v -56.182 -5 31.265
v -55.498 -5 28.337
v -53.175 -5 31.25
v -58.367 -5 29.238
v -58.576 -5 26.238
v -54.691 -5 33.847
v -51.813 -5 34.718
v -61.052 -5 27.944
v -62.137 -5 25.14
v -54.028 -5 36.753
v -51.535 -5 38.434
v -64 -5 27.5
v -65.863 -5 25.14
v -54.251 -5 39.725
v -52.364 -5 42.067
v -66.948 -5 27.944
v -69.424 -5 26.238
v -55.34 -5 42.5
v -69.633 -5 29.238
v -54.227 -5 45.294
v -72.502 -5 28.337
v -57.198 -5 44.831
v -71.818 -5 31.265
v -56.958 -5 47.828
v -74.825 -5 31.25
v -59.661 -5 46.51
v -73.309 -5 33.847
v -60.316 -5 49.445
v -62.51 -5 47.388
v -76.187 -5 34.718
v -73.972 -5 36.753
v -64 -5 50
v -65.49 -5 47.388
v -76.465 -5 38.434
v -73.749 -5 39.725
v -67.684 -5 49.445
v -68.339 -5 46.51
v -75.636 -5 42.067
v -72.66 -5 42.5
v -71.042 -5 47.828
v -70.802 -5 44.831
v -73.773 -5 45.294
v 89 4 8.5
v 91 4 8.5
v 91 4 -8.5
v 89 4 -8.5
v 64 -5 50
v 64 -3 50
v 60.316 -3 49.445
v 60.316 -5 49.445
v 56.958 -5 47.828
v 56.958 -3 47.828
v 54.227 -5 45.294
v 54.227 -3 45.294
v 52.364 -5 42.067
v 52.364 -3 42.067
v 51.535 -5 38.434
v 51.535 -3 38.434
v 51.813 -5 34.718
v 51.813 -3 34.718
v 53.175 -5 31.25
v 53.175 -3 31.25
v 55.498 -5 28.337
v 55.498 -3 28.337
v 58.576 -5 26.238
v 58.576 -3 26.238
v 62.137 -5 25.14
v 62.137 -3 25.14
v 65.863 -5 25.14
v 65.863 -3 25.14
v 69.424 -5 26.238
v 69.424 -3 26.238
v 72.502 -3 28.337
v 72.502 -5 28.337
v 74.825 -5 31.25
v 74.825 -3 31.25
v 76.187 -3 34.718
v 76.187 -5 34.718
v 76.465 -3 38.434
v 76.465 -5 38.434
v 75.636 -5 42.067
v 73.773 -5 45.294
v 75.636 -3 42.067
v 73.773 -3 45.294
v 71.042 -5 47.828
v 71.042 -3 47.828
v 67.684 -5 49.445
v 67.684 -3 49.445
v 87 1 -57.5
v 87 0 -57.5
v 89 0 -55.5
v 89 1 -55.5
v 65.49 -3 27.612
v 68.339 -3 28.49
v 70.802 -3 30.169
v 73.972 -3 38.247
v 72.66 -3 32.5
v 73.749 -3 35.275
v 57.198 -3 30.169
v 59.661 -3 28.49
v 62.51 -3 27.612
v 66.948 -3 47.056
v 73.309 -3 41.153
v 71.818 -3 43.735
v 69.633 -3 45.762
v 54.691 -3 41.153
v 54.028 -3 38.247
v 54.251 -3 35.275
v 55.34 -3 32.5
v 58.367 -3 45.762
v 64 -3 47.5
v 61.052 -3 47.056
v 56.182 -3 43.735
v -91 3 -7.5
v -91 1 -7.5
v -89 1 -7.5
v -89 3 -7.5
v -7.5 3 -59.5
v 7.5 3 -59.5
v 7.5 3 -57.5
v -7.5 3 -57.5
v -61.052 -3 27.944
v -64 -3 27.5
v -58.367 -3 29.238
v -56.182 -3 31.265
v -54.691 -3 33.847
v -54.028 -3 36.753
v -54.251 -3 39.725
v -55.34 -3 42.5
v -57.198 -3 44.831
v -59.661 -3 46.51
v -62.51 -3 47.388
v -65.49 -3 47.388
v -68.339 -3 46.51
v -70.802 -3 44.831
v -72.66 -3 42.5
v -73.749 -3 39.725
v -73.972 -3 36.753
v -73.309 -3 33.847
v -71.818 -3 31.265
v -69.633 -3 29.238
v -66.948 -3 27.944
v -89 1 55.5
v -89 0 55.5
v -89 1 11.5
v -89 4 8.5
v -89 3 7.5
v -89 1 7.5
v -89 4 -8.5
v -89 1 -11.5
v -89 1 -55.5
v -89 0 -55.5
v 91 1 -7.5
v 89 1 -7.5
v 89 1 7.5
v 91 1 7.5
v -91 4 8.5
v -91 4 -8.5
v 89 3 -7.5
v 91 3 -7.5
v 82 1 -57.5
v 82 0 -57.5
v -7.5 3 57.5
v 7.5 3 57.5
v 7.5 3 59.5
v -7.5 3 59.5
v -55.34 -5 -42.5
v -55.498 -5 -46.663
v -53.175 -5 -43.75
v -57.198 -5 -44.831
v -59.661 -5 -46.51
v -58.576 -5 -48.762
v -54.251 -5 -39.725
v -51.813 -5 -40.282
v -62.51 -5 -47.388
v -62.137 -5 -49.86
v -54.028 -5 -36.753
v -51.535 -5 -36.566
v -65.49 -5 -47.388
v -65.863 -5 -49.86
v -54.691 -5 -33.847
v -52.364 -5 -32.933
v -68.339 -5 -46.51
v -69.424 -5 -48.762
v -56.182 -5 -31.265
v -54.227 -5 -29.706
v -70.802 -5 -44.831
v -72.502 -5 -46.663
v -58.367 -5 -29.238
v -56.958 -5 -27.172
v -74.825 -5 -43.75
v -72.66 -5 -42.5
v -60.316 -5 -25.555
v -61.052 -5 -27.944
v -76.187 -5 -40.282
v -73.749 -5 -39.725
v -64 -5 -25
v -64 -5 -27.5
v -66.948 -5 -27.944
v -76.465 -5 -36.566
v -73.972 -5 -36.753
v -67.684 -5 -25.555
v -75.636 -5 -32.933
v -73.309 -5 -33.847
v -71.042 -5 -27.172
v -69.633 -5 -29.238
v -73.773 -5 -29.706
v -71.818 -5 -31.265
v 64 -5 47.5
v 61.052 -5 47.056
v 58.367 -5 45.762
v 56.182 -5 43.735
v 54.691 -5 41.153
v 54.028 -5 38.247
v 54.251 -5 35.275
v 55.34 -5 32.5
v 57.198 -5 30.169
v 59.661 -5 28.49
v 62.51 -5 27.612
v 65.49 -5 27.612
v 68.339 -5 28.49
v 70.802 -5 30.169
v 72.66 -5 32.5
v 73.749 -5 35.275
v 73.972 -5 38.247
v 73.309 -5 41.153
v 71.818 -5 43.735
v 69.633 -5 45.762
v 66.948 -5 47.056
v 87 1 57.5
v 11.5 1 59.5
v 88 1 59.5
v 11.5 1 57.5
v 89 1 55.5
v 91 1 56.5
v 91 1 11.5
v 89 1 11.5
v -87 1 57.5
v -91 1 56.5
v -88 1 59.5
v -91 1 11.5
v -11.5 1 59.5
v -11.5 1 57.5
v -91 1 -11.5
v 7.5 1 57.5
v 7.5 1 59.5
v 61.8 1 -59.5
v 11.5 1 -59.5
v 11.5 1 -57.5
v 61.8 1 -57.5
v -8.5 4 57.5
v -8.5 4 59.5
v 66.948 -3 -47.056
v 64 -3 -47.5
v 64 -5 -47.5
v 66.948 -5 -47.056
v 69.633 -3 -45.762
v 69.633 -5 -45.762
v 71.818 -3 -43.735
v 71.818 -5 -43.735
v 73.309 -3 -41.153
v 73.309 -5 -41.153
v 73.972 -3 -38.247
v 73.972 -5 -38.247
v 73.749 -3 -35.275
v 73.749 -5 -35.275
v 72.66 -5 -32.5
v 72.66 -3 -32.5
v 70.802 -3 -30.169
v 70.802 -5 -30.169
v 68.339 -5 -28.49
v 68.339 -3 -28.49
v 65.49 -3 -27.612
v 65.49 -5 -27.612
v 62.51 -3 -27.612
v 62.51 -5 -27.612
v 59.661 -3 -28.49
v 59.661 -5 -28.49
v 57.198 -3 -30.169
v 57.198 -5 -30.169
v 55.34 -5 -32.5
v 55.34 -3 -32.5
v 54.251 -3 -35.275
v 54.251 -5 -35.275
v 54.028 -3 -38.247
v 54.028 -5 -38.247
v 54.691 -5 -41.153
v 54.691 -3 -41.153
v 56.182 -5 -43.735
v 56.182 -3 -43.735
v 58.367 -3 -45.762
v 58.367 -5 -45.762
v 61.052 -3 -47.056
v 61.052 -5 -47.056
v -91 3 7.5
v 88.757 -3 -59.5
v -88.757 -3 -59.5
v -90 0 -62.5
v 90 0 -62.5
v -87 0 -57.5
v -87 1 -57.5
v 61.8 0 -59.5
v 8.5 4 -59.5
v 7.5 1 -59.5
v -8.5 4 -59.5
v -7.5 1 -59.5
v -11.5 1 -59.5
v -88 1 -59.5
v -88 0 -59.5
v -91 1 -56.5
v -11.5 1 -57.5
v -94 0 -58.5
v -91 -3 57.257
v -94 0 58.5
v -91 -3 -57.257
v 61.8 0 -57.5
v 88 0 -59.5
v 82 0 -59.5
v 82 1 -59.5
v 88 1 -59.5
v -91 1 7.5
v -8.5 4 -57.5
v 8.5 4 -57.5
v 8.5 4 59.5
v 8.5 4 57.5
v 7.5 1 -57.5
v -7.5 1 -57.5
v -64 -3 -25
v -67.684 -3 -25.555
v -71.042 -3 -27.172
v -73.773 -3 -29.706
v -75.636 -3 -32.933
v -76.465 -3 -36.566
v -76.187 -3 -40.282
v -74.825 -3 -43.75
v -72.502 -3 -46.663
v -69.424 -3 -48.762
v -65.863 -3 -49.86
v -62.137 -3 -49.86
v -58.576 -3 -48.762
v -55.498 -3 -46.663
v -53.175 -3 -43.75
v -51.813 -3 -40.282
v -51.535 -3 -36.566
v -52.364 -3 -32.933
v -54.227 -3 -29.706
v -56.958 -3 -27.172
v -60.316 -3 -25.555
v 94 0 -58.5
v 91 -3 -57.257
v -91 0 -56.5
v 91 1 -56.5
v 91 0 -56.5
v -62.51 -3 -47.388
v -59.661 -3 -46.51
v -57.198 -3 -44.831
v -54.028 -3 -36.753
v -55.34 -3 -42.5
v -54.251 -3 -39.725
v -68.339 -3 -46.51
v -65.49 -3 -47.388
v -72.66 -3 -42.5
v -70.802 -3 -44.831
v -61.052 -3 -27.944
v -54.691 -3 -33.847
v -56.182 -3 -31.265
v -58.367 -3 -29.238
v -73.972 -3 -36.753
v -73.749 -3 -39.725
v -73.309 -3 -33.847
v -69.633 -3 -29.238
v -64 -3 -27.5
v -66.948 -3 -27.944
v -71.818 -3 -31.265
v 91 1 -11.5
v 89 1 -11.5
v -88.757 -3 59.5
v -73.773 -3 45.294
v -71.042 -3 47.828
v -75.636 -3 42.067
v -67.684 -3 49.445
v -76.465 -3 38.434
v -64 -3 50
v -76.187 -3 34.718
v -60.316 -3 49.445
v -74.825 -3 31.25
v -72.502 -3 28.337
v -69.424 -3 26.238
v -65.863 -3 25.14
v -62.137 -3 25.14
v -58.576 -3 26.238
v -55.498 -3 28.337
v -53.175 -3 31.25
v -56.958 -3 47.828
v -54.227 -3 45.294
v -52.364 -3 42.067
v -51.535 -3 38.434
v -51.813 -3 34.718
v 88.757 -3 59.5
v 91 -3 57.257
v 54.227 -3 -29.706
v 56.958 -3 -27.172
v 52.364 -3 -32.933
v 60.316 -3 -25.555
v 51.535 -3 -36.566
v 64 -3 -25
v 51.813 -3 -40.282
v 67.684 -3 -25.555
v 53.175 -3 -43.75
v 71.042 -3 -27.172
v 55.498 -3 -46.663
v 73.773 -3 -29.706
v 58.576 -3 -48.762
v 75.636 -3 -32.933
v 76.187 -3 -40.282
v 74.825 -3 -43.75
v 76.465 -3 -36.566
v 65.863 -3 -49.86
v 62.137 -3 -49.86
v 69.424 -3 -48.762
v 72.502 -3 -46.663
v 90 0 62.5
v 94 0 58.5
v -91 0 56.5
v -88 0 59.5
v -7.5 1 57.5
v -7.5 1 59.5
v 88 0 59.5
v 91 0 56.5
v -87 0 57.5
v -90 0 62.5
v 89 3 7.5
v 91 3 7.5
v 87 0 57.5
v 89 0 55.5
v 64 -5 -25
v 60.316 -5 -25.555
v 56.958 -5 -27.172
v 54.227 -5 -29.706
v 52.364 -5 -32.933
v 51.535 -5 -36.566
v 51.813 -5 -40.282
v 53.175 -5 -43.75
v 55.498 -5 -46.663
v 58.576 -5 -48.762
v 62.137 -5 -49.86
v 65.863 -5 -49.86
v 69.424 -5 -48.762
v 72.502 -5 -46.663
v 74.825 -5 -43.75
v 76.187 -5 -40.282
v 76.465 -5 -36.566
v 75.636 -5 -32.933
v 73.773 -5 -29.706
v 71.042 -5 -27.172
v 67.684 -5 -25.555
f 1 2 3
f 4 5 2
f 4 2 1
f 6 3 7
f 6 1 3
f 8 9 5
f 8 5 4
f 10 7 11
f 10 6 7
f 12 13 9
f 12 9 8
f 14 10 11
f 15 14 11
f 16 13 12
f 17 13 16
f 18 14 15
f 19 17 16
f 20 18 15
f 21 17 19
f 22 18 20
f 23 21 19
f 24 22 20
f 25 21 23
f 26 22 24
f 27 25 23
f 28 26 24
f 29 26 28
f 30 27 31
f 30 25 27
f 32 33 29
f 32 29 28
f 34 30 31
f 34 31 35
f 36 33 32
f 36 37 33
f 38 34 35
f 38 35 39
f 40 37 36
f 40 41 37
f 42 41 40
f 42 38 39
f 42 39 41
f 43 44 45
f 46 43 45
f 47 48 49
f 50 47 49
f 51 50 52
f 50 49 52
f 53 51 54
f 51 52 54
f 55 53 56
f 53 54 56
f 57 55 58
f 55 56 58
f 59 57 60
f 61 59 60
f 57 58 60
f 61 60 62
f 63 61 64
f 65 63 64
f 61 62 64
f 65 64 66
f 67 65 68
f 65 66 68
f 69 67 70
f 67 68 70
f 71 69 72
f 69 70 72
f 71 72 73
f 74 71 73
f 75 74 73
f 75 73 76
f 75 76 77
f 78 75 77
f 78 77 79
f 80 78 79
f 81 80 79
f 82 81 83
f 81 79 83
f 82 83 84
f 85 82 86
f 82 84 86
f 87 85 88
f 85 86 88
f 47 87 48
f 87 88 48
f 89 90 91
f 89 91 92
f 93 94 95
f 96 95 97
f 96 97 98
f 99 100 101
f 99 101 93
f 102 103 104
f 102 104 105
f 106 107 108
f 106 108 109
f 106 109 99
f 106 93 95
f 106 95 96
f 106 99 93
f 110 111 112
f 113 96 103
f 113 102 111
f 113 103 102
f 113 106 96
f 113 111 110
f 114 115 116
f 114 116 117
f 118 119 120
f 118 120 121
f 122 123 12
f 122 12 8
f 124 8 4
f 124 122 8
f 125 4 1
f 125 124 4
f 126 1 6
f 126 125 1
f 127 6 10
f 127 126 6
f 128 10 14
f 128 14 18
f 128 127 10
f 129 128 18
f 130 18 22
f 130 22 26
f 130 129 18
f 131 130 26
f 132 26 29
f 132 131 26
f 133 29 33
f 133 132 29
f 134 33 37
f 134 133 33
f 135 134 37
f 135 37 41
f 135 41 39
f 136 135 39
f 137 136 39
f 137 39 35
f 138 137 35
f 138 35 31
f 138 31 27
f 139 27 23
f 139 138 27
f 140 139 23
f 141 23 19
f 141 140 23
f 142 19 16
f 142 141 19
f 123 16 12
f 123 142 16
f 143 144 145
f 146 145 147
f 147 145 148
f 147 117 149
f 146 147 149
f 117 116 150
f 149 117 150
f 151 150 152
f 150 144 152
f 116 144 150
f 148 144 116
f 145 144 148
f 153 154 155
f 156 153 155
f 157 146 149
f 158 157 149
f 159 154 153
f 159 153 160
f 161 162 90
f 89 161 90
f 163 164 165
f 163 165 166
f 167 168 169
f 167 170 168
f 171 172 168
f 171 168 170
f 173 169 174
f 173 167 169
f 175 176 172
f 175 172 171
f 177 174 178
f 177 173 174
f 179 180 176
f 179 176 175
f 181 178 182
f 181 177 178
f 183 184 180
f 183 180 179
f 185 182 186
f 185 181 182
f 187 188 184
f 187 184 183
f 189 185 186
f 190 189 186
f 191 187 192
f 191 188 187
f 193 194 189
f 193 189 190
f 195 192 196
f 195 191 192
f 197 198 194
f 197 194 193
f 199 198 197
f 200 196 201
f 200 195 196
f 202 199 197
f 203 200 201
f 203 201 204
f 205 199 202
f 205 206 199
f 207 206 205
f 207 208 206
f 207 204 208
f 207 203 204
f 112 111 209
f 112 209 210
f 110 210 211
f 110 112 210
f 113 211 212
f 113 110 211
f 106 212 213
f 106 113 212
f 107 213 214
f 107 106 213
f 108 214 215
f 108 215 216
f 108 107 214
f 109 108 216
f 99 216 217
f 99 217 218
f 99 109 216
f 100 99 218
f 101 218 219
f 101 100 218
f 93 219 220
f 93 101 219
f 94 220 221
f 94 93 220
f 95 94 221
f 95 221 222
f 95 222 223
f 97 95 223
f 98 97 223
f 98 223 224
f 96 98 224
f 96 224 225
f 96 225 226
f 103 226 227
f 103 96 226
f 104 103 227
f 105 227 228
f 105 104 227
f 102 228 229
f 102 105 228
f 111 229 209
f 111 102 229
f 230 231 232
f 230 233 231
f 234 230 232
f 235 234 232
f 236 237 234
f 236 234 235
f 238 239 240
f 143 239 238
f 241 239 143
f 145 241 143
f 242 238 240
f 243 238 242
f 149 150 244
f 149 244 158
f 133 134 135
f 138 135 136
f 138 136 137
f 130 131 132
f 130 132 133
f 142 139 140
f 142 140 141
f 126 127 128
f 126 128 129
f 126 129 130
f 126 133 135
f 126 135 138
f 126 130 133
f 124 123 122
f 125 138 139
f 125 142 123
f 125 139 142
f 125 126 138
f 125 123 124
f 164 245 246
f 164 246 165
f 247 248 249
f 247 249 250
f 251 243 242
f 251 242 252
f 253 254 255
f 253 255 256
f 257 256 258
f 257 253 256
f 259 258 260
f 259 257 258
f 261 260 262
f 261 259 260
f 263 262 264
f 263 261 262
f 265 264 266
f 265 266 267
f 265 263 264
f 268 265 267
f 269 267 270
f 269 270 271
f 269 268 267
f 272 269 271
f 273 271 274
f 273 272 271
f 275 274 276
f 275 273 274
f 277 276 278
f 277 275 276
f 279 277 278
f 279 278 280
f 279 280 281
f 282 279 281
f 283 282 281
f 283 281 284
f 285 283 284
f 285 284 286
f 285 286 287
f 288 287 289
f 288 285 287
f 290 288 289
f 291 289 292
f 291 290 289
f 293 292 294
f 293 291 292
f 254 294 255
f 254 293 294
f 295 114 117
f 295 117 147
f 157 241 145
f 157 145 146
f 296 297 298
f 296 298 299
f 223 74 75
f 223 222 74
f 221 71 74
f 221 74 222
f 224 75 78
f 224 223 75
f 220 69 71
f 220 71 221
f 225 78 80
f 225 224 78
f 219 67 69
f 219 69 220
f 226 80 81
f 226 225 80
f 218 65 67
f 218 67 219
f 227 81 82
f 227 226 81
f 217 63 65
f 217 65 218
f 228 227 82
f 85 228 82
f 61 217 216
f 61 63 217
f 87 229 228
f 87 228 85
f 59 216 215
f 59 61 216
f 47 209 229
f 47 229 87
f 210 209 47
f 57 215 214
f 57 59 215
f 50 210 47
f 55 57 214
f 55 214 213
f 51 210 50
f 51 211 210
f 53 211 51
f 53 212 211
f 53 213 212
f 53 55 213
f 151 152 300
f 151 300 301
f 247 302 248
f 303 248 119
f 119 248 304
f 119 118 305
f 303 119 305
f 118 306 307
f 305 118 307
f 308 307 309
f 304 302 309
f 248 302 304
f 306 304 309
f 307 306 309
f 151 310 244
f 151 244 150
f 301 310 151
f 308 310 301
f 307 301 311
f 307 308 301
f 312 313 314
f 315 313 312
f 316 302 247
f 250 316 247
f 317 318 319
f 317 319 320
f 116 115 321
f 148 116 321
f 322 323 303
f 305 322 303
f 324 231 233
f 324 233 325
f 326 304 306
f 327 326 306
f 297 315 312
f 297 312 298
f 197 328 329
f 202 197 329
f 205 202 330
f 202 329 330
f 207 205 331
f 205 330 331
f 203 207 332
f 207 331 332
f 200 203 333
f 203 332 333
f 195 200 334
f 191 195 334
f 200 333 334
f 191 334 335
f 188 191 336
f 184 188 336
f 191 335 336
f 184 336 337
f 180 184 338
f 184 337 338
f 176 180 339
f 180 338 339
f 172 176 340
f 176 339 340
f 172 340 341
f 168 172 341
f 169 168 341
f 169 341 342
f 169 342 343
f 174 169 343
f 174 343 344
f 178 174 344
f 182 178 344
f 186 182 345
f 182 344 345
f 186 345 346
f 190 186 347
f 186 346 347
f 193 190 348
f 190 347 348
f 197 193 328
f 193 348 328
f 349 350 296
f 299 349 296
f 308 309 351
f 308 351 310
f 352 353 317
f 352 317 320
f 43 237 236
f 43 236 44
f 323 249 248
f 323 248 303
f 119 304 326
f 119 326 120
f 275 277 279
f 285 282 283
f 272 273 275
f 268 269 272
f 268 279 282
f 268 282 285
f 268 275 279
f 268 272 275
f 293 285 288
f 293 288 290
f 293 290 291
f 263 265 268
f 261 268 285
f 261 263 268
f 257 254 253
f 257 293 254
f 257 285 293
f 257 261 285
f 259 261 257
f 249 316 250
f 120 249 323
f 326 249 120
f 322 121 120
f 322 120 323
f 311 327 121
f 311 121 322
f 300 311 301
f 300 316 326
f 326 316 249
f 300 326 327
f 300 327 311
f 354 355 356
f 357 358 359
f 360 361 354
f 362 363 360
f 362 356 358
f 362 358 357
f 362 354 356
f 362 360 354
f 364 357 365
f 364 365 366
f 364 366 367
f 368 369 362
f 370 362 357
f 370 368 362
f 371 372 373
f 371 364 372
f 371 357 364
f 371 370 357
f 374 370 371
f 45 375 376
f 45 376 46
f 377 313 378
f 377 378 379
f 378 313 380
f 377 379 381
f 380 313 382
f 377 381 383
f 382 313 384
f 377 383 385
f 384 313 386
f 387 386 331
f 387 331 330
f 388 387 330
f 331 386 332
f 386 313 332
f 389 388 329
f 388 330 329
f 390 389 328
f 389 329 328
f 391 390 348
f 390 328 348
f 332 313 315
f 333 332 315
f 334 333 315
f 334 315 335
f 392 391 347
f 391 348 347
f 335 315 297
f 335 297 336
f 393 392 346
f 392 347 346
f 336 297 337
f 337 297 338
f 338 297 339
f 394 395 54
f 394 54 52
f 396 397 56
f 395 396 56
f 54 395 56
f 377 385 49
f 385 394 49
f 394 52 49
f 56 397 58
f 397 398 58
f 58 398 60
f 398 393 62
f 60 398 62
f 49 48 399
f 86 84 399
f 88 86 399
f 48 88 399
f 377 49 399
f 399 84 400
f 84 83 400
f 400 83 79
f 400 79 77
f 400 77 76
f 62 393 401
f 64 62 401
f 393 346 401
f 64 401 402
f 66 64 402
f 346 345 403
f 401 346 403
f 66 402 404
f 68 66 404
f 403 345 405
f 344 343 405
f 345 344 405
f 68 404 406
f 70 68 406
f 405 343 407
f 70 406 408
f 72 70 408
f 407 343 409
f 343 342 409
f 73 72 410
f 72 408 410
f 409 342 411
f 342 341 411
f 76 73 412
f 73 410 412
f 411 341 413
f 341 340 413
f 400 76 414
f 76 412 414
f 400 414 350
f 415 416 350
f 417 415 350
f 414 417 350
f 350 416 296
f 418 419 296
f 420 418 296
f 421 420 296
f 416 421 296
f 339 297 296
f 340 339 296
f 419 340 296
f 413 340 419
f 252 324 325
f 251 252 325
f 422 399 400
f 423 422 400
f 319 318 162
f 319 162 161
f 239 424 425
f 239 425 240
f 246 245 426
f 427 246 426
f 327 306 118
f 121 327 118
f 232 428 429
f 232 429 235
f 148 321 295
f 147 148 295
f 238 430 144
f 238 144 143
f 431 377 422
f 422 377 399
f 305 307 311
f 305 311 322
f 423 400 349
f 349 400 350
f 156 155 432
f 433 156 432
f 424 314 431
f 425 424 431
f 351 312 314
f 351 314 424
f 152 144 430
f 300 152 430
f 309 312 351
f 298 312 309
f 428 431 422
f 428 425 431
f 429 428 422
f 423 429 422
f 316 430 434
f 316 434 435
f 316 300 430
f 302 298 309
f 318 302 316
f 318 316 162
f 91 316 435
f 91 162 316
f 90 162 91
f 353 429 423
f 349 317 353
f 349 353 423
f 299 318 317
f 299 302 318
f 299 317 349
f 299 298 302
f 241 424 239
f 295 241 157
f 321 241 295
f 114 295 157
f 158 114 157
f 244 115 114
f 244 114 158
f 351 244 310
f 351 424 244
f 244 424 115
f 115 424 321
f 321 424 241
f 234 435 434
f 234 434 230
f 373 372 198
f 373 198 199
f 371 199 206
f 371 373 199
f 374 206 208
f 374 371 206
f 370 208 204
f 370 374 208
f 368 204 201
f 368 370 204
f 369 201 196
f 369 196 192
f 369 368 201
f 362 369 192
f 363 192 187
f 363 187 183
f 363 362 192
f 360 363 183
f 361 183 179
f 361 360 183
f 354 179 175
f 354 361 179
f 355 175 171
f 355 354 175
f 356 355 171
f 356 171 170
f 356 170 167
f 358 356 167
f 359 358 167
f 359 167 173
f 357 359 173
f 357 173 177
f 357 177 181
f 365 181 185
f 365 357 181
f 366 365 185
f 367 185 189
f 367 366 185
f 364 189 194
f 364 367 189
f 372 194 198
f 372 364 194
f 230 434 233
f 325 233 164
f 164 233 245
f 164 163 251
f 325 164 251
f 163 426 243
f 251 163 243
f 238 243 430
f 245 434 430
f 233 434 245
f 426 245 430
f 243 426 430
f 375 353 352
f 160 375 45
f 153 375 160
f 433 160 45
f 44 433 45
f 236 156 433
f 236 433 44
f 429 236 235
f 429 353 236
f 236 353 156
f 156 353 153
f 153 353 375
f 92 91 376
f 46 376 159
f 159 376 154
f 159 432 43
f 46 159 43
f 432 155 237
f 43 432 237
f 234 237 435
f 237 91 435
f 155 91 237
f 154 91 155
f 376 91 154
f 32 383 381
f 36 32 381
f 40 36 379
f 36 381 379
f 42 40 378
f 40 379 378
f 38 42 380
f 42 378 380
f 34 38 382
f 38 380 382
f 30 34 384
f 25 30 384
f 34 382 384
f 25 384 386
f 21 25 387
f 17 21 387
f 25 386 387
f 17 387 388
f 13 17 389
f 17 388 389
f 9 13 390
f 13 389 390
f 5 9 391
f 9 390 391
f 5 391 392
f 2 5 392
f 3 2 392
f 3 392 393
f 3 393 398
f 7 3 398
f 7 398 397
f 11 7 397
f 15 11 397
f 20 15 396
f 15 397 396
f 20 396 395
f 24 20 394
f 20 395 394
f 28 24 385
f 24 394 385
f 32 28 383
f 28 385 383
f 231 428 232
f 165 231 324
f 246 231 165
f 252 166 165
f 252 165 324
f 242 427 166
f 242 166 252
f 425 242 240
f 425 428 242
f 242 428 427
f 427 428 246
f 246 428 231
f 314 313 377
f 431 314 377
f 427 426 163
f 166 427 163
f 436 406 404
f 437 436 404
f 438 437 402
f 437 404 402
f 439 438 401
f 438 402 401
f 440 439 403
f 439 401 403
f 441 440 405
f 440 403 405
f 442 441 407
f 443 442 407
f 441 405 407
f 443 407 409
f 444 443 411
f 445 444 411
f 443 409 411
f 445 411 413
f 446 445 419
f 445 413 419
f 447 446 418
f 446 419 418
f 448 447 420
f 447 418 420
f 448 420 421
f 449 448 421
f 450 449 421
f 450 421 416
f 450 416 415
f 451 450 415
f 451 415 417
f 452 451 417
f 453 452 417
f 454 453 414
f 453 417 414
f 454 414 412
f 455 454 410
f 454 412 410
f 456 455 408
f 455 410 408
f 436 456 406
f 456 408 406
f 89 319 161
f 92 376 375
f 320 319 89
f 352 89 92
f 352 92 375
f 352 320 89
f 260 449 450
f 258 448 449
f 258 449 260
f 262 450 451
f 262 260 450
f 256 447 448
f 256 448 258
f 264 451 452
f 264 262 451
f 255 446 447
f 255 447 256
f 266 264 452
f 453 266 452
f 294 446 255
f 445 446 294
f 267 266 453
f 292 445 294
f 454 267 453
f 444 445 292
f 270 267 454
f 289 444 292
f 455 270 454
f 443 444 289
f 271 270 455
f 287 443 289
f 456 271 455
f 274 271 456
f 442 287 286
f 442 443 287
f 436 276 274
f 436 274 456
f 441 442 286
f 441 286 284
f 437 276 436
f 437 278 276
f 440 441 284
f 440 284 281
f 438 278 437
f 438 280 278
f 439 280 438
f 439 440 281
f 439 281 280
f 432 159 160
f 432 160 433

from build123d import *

# Parameters (mm, degrees)
SKETCH_1_W          = 188
SKETCH_1_H          = 125
EXTRUDE_1_DEPTH     = 3
SKETCH_2_W          = 182
SKETCH_2_H          = 119
SKETCH_2_W_2        = 178
SKETCH_2_H_2        = 115
EXTRUDE_2_DEPTH     = 1
CUT_EXTRUDE_1_REACH = 156.042
SKETCH_4_W          = 20.2
SKETCH_4_H          = 1
SKETCH_5_W          = 15
SKETCH_5_H          = 2
SKETCH_5_W_2        = 2
SKETCH_5_H_2        = 15
EXTRUDE_3_DEPTH     = 3
CHAMFER_1_SIZE      = 4
CUT_EXTRUDE_2_REACH = 156.065
SKETCH_6_W          = 15
SKETCH_6_H          = 2
CUT_EXTRUDE_3_REACH = 197.313
SKETCH_7_W          = 15
SKETCH_7_H          = 2
SKETCH_8_R          = 12.5
EXTRUDE_4_DEPTH     = 2
SKETCH_9_R          = 10
CUT_EXTRUDE_4_DEPTH = 2
CHAMFER_2_SIZE      = 4
CHAMFER_3_SIZE      = 3
CHAMFER_4_SIZE      = 2
CHAMFER_5_SIZE      = 3


# Some blends are built 0.0001 mm under size
with BuildPart() as part:
    # 草图1 → 凸台-拉伸1 (new body)
    with BuildSketch(Plane(origin=(0, 0, 0), x_dir=(1, 0, 0), z_dir=(0, 1, 0))):
        Rectangle(SKETCH_1_W, SKETCH_1_H)
    extrude(amount=-EXTRUDE_1_DEPTH)

    # 草图2 → 凸台-拉伸2 (add)
    with BuildSketch(Plane(origin=(0, 0, 0), x_dir=(1, 0, 0), z_dir=(0, 1, 0))):
        Rectangle(SKETCH_2_W, SKETCH_2_H)
        Rectangle(SKETCH_2_W_2, SKETCH_2_H_2, mode=Mode.SUBTRACT)
    extrude(amount=EXTRUDE_2_DEPTH)

    # 草图4 → 切除-拉伸1 (cut, up to next)
    with BuildSketch(Plane(origin=(0, 0, -59.5), x_dir=(-1, 0, 0), z_dir=(0, 0, -1)), mode=Mode.PRIVATE) as cut_extrude_1_sk1:
        with Locations((-71.9, 0.5)):
            Rectangle(SKETCH_4_W, SKETCH_4_H)
    cut_extrude_1_tool1 = extrude(cut_extrude_1_sk1.sketch, amount=-CUT_EXTRUDE_1_REACH, mode=Mode.PRIVATE) & part.part
    add(cut_extrude_1_tool1.solids().sort_by_distance((71.9, 0.5, -59.5))[0], mode=Mode.SUBTRACT)

    # 草图5 → 凸台-拉伸3 (add)
    with BuildSketch(Plane(origin=(0, 1, 0), x_dir=(1, 0, 0), z_dir=(0, 1, 0))):
        with Locations((0, -58.5)):
            Rectangle(SKETCH_5_W, SKETCH_5_H)
        with Locations((90, 0)):
            Rectangle(SKETCH_5_W_2, SKETCH_5_H_2)
        with Locations((0, 58.5)):
            Rectangle(SKETCH_5_W, SKETCH_5_H)
        with Locations((-90, 0)):
            Rectangle(SKETCH_5_W_2, SKETCH_5_H_2)
    extrude(amount=EXTRUDE_3_DEPTH)

    # 倒角1
    # the kernel refuses this chamfer: 4 mm, written as the material it adds along each edge
    with BuildSketch(Plane(origin=(-89, 1, -7.5), x_dir=(0, -0.027495876610586372, -0.9996219169112968), z_dir=(-1, 0, 0))) as chamfer_1_piece_1_section:
        Polygon((CHAMFER_1_SIZE * 0.999621916911, -CHAMFER_1_SIZE * 0.0274958766106), (-CHAMFER_1_SIZE * 0.0274958766106, -CHAMFER_1_SIZE * 0.999621916911), (0, 0), align=None)
    chamfer_1_piece_1 = extrude(amount=2, mode=Mode.PRIVATE)
    chamfer_1_piece_1 = split(chamfer_1_piece_1, bisect_by=Plane(origin=(-90, 4, -8.907836441), z_dir=(0, -1, 0)), keep=Keep.TOP, mode=Mode.PRIVATE)
    add(chamfer_1_piece_1)
    with BuildSketch(Plane(origin=(-91, 1, 7.5), x_dir=(0, -0.027495876610586382, 0.9996219169112968), z_dir=(1, 0, 0))) as chamfer_1_piece_2_section:
        Polygon((CHAMFER_1_SIZE * 0.999621916911, -CHAMFER_1_SIZE * 0.0274958766106), (-CHAMFER_1_SIZE * 0.0274958766106, -CHAMFER_1_SIZE * 0.999621916911), (0, 0), align=None)
    chamfer_1_piece_2 = extrude(amount=2, mode=Mode.PRIVATE)
    chamfer_1_piece_2 = split(chamfer_1_piece_2, bisect_by=Plane(origin=(-90, 4, 8.907836441), z_dir=(0, -1, 0)), keep=Keep.TOP, mode=Mode.PRIVATE)
    add(chamfer_1_piece_2)
    with BuildSketch(Plane(origin=(-7.5, 1, 57.5), x_dir=(-0.9996219169112968, -0.027495876610586382, 0), z_dir=(0, 0, 1))) as chamfer_1_piece_3_section:
        Polygon((CHAMFER_1_SIZE * 0.999621916911, -CHAMFER_1_SIZE * 0.0274958766106), (-CHAMFER_1_SIZE * 0.0274958766106, -CHAMFER_1_SIZE * 0.999621916911), (0, 0), align=None)
    chamfer_1_piece_3 = extrude(amount=2, mode=Mode.PRIVATE)
    chamfer_1_piece_3 = split(chamfer_1_piece_3, bisect_by=Plane(origin=(-8.907836441, 4, 58.5), z_dir=(0, -1, 0)), keep=Keep.TOP, mode=Mode.PRIVATE)
    add(chamfer_1_piece_3)
    with BuildSketch(Plane(origin=(7.5, 1, 59.5), x_dir=(0.9996219169112968, -0.02749587661058638, 0), z_dir=(0, 0, -1))) as chamfer_1_piece_4_section:
        Polygon((CHAMFER_1_SIZE * 0.999621916911, -CHAMFER_1_SIZE * 0.0274958766106), (-CHAMFER_1_SIZE * 0.0274958766106, -CHAMFER_1_SIZE * 0.999621916911), (0, 0), align=None)
    chamfer_1_piece_4 = extrude(amount=2, mode=Mode.PRIVATE)
    chamfer_1_piece_4 = split(chamfer_1_piece_4, bisect_by=Plane(origin=(8.907836441, 4, 58.5), z_dir=(0, -1, 0)), keep=Keep.TOP, mode=Mode.PRIVATE)
    add(chamfer_1_piece_4)
    with BuildSketch(Plane(origin=(89, 1, 7.5), x_dir=(0, -0.027495876610586372, 0.9996219169112968), z_dir=(1, 0, 0))) as chamfer_1_piece_5_section:
        Polygon((CHAMFER_1_SIZE * 0.999621916911, -CHAMFER_1_SIZE * 0.0274958766106), (-CHAMFER_1_SIZE * 0.0274958766106, -CHAMFER_1_SIZE * 0.999621916911), (0, 0), align=None)
    chamfer_1_piece_5 = extrude(amount=2, mode=Mode.PRIVATE)
    chamfer_1_piece_5 = split(chamfer_1_piece_5, bisect_by=Plane(origin=(90, 4, 8.907836441), z_dir=(0, -1, 0)), keep=Keep.TOP, mode=Mode.PRIVATE)
    add(chamfer_1_piece_5)
    with BuildSketch(Plane(origin=(91, 1, -7.5), x_dir=(0, -0.02749587661058638, -0.9996219169112968), z_dir=(-1, 0, 0))) as chamfer_1_piece_6_section:
        Polygon((CHAMFER_1_SIZE * 0.999621916911, -CHAMFER_1_SIZE * 0.0274958766106), (-CHAMFER_1_SIZE * 0.0274958766106, -CHAMFER_1_SIZE * 0.999621916911), (0, 0), align=None)
    chamfer_1_piece_6 = extrude(amount=2, mode=Mode.PRIVATE)
    chamfer_1_piece_6 = split(chamfer_1_piece_6, bisect_by=Plane(origin=(90, 4, -8.907836441), z_dir=(0, -1, 0)), keep=Keep.TOP, mode=Mode.PRIVATE)
    add(chamfer_1_piece_6)
    with BuildSketch(Plane(origin=(-7.5, 1, -59.5), x_dir=(-0.9996219169112968, -0.02749587661058638, 0), z_dir=(0, 0, 1))) as chamfer_1_piece_7_section:
        Polygon((CHAMFER_1_SIZE * 0.999621916911, -CHAMFER_1_SIZE * 0.0274958766106), (-CHAMFER_1_SIZE * 0.0274958766106, -CHAMFER_1_SIZE * 0.999621916911), (0, 0), align=None)
    chamfer_1_piece_7 = extrude(amount=2, mode=Mode.PRIVATE)
    chamfer_1_piece_7 = split(chamfer_1_piece_7, bisect_by=Plane(origin=(-8.907836441, 4, -58.5), z_dir=(0, -1, 0)), keep=Keep.TOP, mode=Mode.PRIVATE)
    add(chamfer_1_piece_7)
    with BuildSketch(Plane(origin=(7.5, 1, -57.5), x_dir=(0.9996219169112968, -0.027495876610586372, 0), z_dir=(0, 0, -1))) as chamfer_1_piece_8_section:
        Polygon((CHAMFER_1_SIZE * 0.999621916911, -CHAMFER_1_SIZE * 0.0274958766106), (-CHAMFER_1_SIZE * 0.0274958766106, -CHAMFER_1_SIZE * 0.999621916911), (0, 0), align=None)
    chamfer_1_piece_8 = extrude(amount=2, mode=Mode.PRIVATE)
    chamfer_1_piece_8 = split(chamfer_1_piece_8, bisect_by=Plane(origin=(8.907836441, 4, -58.5), z_dir=(0, -1, 0)), keep=Keep.TOP, mode=Mode.PRIVATE)
    add(chamfer_1_piece_8)

    # 切除-拉伸2: up to this face of the body (flat: up to its plane)
    cut_extrude_2_end = Plane(part.part.faces().sort_by_distance((0, 0.977272727, 59.5))[0])
    # 草图6 → 切除-拉伸2 (cut, up to the picked face)
    with BuildSketch(Plane(origin=(0, 0, -59.5), x_dir=(-1, 0, 0), z_dir=(0, 0, -1)), mode=Mode.PRIVATE) as cut_extrude_2_sk1:
        with Locations((0, 2)):
            Rectangle(SKETCH_6_W, SKETCH_6_H)
    cut_extrude_2_tool1 = split(extrude(cut_extrude_2_sk1.sketch, amount=-CUT_EXTRUDE_2_REACH, mode=Mode.PRIVATE), bisect_by=cut_extrude_2_end, keep=Keep.BOTH, mode=Mode.PRIVATE)
    add(cut_extrude_2_tool1.solids().sort_by(Axis((0, 2, -59.5), (0, 0, 1)))[0], mode=Mode.SUBTRACT)

    # 切除-拉伸3: up to this face of the body (flat: up to its plane)
    cut_extrude_3_end = Plane(part.part.faces().sort_by_distance((91, 1.145251397, 0))[0])
    # 草图7 → 切除-拉伸3 (cut, up to the picked face)
    with BuildSketch(Plane.ZY.offset(91), mode=Mode.PRIVATE) as cut_extrude_3_sk1:
        with Locations((0, 2)):
            Rectangle(SKETCH_7_W, SKETCH_7_H)
    cut_extrude_3_tool1 = split(extrude(cut_extrude_3_sk1.sketch, amount=-CUT_EXTRUDE_3_REACH, mode=Mode.PRIVATE), bisect_by=cut_extrude_3_end, keep=Keep.BOTH, mode=Mode.PRIVATE)
    add(cut_extrude_3_tool1.solids().sort_by(Axis((-91, 2, 0), (1, 0, 0)))[0], mode=Mode.SUBTRACT)

    # 草图8 → 凸台-拉伸4 (add)
    with BuildSketch(Plane.XZ.offset(3)):
        with Locations(Location((-64, 37.5, 0), (0, 0, 90))):
            Circle(SKETCH_8_R)
        with Locations(Location((-64, -37.5, 0), (0, 0, 90))):
            Circle(SKETCH_8_R)
        with Locations(Location((64, 37.5, 0), (0, 0, 90))):
            Circle(SKETCH_8_R)
        with Locations(Location((64, -37.5, 0), (0, 0, 90))):
            Circle(SKETCH_8_R)
    extrude(amount=EXTRUDE_4_DEPTH)

    # 草图9 → 切除-拉伸4 (cut)
    with BuildSketch(Plane.XZ.offset(3)):
        with Locations(Location((-64, 37.5, 0), (0, 0, 270))):
            Circle(SKETCH_9_R)
        with Locations(Location((-64, -37.5, 0), (0, 0, 90))):
            Circle(SKETCH_9_R)
        with Locations(Location((64, 37.5, 0), (0, 0, 90))):
            Circle(SKETCH_9_R)
        with Locations(Location((64, -37.5, 0), (0, 0, 270))):
            Circle(SKETCH_9_R)
    extrude(amount=CUT_EXTRUDE_4_DEPTH, mode=Mode.SUBTRACT)

    # 倒角2
    chamfer_2_edges = [part.edges().sort_by_distance(p)[0] for p in [
        (-94, -1.5, -62.5),
        (94, -1.5, -62.5),
        (94, -1.5, 62.5),
        (-94, -1.5, 62.5),
    ]]
    chamfer(chamfer_2_edges, length=CHAMFER_2_SIZE)

    # 倒角3
    chamfer_3_edges = [part.edges().sort_by_distance(p)[0] for p in [
        (92, -3, -60.5),
        (0, -3, -62.5),
        (-92, -3, -60.5),
        (-94, -3, 0),
        (-92, -3, 60.5),
        (0, -3, 62.5),
        (92, -3, 60.5),
        (94, -3, 0),
    ]]
    chamfer(chamfer_3_edges, length=CHAMFER_3_SIZE - 0.0001)  # a hair under: the kernel refuses the full size

    # 倒角4
    chamfer_4_edges = [part.edges().sort_by_distance(p)[0] for p in [
        (-89, 0.5, 57.5),
        (89, 0.5, 57.5),
        (89, 0.5, -57.5),
        (-89, 0.5, -57.5),
    ]]
    chamfer(chamfer_4_edges, length=CHAMFER_4_SIZE)

    # 倒角5
    chamfer_5_edges = [part.edges().sort_by_distance(p)[0] for p in [
        (-91, 0.5, -59.5),
        (-91, 0.5, 59.5),
        (91, 0.5, 59.5),
        (91, 0.5, -59.5),
    ]]
    chamfer(chamfer_5_edges, length=CHAMFER_5_SIZE)


solid = part.part
